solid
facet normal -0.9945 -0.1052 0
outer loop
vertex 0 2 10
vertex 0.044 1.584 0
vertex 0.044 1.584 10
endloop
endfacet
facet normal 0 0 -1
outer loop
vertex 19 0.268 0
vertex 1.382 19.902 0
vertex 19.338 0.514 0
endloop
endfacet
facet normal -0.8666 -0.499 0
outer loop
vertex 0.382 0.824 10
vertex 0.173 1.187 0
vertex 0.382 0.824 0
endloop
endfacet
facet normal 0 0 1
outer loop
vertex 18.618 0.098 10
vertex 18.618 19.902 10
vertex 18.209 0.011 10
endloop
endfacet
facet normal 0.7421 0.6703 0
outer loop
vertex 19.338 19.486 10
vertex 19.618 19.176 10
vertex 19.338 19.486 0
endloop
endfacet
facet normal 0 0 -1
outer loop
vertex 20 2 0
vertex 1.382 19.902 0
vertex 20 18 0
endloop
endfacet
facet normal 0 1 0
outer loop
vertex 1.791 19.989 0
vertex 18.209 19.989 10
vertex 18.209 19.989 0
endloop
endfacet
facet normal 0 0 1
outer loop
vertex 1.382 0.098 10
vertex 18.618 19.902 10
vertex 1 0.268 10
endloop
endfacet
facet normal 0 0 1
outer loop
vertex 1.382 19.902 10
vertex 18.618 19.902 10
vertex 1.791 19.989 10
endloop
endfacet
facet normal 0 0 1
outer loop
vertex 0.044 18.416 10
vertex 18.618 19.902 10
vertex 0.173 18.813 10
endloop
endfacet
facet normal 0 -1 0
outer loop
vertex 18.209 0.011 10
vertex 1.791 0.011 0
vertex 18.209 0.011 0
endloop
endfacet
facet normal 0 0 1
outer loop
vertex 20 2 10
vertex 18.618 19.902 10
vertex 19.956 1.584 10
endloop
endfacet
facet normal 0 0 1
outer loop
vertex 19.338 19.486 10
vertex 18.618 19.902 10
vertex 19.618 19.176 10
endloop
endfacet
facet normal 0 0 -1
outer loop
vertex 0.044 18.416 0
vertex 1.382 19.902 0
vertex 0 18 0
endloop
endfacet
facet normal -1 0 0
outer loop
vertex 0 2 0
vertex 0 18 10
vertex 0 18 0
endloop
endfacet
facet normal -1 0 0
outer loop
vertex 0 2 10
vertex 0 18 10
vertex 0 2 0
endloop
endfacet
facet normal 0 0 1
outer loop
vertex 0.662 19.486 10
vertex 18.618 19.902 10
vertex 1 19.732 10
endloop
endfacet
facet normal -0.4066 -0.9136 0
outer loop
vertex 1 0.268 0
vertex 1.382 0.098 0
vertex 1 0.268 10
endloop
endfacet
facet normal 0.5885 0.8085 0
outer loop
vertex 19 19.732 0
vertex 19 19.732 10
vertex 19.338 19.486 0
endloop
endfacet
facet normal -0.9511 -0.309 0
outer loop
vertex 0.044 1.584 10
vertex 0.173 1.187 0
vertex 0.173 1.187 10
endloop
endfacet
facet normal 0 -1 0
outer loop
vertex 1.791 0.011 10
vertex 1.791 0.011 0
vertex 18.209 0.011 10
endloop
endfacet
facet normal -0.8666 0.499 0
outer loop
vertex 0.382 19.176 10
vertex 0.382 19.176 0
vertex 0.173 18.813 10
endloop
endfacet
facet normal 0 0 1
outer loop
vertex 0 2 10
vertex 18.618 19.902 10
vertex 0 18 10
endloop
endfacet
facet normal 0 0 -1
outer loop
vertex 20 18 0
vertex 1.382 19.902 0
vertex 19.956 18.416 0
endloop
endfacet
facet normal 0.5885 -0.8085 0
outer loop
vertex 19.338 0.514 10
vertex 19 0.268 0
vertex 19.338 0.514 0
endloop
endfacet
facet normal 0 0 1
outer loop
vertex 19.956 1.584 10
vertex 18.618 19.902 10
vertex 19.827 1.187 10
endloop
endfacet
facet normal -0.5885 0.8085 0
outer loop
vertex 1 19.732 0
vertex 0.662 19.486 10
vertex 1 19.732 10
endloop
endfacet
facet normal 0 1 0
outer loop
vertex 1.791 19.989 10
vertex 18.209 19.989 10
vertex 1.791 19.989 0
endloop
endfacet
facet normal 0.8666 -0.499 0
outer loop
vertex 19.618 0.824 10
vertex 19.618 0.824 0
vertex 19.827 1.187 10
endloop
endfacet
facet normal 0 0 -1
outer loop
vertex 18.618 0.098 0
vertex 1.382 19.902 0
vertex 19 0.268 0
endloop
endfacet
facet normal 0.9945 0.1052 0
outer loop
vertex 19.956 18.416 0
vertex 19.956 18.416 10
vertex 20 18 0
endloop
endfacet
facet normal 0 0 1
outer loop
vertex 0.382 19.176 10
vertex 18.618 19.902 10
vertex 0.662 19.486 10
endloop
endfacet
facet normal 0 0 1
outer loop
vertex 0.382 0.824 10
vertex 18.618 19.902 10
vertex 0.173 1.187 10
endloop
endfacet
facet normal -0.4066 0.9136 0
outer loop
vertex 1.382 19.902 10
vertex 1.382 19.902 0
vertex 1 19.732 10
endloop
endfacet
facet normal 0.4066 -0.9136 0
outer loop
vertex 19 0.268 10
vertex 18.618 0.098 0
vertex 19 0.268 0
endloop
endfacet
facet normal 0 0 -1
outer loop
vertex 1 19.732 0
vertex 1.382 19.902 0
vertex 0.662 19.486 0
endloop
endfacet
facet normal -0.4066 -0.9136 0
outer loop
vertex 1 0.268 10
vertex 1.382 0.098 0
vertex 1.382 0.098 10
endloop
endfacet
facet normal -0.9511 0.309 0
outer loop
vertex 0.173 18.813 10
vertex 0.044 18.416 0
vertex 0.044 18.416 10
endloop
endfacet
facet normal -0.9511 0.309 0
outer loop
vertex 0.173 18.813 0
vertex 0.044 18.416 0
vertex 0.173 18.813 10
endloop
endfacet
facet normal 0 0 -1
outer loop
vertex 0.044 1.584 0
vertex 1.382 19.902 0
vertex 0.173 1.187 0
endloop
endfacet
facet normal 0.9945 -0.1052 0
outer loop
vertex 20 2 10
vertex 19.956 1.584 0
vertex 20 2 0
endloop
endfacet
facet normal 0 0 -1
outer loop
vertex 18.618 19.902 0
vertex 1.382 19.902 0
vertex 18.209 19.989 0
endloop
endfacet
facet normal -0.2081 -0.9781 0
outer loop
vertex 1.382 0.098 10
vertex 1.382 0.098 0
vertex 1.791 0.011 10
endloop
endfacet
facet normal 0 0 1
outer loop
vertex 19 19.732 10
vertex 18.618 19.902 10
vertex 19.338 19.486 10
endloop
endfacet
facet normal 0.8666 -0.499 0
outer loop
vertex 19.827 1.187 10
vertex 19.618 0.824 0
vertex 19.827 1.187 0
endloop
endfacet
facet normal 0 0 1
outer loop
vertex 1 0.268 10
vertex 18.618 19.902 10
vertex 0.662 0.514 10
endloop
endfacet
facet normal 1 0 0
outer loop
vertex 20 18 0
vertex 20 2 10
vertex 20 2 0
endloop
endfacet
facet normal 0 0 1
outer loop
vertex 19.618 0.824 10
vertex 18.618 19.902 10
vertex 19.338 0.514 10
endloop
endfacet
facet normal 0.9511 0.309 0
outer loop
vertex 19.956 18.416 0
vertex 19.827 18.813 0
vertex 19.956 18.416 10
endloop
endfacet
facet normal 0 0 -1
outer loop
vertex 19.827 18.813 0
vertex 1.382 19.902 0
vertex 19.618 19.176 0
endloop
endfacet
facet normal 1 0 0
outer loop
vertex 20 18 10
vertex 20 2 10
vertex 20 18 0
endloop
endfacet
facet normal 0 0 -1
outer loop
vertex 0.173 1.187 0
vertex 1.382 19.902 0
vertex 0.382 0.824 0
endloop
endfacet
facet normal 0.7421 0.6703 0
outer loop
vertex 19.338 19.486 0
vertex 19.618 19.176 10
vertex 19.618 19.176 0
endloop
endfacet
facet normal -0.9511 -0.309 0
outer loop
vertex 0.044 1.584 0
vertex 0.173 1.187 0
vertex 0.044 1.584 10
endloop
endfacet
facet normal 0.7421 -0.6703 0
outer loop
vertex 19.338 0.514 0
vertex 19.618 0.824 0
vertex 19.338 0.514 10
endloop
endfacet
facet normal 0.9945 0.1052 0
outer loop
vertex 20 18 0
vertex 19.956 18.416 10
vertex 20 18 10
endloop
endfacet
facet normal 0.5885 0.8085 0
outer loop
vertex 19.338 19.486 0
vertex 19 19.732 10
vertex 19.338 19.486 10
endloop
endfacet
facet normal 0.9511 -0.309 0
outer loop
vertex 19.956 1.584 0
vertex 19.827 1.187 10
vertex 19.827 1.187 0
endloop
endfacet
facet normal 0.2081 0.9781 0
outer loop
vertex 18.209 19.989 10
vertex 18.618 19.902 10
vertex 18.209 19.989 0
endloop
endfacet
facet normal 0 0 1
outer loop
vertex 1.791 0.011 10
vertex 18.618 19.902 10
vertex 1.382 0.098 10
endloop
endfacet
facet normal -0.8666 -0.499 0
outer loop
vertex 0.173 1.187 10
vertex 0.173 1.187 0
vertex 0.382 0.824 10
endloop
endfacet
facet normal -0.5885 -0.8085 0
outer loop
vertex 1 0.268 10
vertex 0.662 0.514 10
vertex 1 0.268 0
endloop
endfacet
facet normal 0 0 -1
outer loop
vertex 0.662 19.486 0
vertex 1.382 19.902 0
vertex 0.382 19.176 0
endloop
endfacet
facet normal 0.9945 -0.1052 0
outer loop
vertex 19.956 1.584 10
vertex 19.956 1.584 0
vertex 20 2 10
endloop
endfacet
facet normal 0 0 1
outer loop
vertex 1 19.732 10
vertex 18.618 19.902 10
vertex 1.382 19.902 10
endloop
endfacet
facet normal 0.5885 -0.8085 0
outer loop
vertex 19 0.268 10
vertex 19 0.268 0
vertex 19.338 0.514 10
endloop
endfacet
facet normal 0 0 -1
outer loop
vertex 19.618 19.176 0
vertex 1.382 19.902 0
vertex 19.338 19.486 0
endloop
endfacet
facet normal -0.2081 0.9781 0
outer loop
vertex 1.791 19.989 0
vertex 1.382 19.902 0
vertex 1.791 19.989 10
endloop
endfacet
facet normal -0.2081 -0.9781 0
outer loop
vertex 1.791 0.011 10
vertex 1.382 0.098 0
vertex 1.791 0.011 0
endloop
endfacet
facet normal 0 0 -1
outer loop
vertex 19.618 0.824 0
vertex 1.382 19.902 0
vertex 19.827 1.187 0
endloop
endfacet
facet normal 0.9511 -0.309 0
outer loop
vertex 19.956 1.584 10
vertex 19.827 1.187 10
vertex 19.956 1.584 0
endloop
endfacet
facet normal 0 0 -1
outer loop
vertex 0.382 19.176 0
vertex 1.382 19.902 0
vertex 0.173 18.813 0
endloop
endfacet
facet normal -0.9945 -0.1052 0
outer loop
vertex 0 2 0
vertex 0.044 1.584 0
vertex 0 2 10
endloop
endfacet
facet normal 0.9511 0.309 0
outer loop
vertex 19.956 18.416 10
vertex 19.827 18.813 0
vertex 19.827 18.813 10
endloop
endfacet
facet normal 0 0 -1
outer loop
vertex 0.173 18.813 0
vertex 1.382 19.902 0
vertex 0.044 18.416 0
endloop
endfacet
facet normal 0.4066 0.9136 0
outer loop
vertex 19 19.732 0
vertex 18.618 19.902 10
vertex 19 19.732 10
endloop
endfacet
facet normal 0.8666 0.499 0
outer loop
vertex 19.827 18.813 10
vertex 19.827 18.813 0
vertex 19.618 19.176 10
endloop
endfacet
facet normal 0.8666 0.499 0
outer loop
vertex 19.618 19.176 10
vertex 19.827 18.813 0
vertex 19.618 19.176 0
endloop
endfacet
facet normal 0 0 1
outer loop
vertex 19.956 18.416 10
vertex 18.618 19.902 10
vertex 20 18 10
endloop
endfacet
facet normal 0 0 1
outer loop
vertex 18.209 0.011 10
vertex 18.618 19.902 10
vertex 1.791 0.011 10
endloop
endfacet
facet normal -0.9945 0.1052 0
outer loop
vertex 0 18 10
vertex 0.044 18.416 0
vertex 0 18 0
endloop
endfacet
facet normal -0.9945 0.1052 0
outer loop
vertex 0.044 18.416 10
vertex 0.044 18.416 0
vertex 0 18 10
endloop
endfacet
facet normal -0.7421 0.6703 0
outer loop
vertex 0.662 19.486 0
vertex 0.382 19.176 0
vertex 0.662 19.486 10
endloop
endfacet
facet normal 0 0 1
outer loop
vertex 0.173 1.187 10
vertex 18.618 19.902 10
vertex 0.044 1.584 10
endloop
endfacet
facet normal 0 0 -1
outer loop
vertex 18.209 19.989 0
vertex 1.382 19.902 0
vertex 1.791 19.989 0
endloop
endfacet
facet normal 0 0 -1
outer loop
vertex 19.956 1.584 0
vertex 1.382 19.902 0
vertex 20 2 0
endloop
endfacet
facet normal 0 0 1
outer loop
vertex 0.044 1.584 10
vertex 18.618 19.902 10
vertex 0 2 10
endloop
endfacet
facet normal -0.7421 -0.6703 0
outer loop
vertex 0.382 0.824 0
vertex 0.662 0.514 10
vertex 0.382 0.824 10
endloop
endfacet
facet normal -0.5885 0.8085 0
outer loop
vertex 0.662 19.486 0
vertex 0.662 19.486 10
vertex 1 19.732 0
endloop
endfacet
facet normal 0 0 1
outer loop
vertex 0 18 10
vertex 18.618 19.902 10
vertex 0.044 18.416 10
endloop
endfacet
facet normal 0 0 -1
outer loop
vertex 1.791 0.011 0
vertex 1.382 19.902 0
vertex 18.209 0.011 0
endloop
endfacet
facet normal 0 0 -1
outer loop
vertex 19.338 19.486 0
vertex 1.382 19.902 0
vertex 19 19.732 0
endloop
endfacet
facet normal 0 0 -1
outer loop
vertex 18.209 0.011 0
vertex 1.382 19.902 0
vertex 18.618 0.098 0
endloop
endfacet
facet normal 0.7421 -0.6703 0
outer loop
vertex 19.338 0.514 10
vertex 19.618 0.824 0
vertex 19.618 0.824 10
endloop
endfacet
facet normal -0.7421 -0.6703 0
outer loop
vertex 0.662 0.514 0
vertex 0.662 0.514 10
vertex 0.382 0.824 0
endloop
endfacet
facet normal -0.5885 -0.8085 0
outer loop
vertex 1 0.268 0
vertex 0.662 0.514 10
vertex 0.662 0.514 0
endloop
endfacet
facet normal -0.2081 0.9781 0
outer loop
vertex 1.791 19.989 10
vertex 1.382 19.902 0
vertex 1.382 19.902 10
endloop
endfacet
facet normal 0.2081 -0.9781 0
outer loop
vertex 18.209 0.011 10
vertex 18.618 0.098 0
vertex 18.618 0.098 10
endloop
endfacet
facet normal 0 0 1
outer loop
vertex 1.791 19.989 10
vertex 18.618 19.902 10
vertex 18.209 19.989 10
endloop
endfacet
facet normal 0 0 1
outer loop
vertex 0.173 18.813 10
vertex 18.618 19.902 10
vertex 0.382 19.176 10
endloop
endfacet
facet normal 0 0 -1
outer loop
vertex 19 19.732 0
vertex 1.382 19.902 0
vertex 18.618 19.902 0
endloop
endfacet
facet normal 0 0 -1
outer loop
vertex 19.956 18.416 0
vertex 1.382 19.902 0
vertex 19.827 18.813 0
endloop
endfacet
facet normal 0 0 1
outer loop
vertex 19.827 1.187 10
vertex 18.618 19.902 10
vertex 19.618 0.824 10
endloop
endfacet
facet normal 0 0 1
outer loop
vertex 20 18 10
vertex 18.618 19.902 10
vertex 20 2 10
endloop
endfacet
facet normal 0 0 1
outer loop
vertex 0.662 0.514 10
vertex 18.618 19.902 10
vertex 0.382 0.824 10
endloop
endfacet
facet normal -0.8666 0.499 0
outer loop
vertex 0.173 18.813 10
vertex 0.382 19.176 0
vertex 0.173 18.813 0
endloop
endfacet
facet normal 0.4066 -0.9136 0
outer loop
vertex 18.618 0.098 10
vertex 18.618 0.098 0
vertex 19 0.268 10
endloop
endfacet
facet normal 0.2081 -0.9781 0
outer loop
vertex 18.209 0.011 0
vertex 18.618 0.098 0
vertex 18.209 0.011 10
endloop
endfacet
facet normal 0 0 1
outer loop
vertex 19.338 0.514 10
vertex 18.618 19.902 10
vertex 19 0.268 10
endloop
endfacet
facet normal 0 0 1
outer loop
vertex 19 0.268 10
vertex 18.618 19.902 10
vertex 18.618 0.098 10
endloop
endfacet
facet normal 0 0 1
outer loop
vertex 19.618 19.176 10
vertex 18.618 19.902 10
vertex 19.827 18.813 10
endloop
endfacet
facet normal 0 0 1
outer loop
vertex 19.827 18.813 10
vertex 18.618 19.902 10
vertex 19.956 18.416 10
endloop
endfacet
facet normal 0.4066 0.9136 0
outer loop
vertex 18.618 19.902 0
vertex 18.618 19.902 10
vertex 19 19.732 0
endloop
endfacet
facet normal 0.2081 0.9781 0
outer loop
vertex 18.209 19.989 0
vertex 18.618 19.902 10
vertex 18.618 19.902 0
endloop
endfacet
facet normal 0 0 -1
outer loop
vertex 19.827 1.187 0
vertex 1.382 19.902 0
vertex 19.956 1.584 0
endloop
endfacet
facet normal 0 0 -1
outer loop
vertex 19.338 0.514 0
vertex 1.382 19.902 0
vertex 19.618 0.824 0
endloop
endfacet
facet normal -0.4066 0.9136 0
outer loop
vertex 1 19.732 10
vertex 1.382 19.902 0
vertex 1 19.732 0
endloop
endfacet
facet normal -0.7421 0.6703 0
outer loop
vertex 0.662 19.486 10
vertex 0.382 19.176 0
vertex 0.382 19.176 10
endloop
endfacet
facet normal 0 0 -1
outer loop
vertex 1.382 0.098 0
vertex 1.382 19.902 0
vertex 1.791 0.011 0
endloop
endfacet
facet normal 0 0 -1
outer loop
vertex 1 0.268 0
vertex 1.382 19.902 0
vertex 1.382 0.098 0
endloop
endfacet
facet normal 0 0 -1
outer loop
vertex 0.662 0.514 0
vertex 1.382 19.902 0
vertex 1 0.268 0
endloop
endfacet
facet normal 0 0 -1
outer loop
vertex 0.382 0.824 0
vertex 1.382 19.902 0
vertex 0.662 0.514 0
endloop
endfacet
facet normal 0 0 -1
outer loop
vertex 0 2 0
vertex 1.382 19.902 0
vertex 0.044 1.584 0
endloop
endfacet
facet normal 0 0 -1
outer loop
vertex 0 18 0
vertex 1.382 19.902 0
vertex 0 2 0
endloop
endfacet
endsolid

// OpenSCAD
// Rounded Box using Hull Method
// Creates box with rounded vertical edges

$fn = 30;
r = 2;  // Corner radius
width = 20;
height = 20;
depth = 10;

hull() {
    // Place cylinders at each corner
    translate([r, r, 0])
        cylinder(r=r, h=depth);
    translate([width-r, r, 0])
        cylinder(r=r, h=depth);
    translate([r, height-r, 0])
        cylinder(r=r, h=depth);
    translate([width-r, height-r, 0])
        cylinder(r=r, h=depth);
}
